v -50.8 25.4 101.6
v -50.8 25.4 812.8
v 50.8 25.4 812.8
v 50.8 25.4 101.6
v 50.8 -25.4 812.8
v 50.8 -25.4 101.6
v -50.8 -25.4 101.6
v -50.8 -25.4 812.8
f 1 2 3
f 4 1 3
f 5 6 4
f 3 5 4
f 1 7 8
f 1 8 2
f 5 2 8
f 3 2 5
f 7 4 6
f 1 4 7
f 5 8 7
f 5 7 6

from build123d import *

# Parameters (mm, degrees)
SKETCH1_W           = 101.6
SKETCH1_H           = 50.8
BOSS_EXTRUDE1_DEPTH = 914.4
SKETCH2_W           = 101.6
SKETCH2_H           = 50.8
CUT_EXTRUDE1_DEPTH  = 101.6
SKETCH3_W           = 101.6
SKETCH3_H           = 101.6
CUT_EXTRUDE2_DEPTH  = 50.8


with BuildPart() as part:
    # Sketch1 → Boss-Extrude1 (new body)
    with BuildSketch(Plane.XY):
        Rectangle(SKETCH1_W, SKETCH1_H)
    extrude(amount=BOSS_EXTRUDE1_DEPTH)

    # Sketch2 → Cut-Extrude1 (cut)
    with BuildSketch(Plane(origin=(0, 0, 0), x_dir=(-1, 0, 0), z_dir=(0, 0, -1))):
        Rectangle(SKETCH2_W, SKETCH2_H)
    extrude(amount=-CUT_EXTRUDE1_DEPTH, mode=Mode.SUBTRACT)

    # Sketch3 → Cut-Extrude2 (cut)
    with BuildSketch(Plane(origin=(0, 25.4, 0), x_dir=(1, 0, 0), z_dir=(0, 1, 0))):
        with Locations((0, -863.6)):
            Rectangle(SKETCH3_W, SKETCH3_H)
    extrude(amount=-CUT_EXTRUDE2_DEPTH, mode=Mode.SUBTRACT)


solid = part.part
